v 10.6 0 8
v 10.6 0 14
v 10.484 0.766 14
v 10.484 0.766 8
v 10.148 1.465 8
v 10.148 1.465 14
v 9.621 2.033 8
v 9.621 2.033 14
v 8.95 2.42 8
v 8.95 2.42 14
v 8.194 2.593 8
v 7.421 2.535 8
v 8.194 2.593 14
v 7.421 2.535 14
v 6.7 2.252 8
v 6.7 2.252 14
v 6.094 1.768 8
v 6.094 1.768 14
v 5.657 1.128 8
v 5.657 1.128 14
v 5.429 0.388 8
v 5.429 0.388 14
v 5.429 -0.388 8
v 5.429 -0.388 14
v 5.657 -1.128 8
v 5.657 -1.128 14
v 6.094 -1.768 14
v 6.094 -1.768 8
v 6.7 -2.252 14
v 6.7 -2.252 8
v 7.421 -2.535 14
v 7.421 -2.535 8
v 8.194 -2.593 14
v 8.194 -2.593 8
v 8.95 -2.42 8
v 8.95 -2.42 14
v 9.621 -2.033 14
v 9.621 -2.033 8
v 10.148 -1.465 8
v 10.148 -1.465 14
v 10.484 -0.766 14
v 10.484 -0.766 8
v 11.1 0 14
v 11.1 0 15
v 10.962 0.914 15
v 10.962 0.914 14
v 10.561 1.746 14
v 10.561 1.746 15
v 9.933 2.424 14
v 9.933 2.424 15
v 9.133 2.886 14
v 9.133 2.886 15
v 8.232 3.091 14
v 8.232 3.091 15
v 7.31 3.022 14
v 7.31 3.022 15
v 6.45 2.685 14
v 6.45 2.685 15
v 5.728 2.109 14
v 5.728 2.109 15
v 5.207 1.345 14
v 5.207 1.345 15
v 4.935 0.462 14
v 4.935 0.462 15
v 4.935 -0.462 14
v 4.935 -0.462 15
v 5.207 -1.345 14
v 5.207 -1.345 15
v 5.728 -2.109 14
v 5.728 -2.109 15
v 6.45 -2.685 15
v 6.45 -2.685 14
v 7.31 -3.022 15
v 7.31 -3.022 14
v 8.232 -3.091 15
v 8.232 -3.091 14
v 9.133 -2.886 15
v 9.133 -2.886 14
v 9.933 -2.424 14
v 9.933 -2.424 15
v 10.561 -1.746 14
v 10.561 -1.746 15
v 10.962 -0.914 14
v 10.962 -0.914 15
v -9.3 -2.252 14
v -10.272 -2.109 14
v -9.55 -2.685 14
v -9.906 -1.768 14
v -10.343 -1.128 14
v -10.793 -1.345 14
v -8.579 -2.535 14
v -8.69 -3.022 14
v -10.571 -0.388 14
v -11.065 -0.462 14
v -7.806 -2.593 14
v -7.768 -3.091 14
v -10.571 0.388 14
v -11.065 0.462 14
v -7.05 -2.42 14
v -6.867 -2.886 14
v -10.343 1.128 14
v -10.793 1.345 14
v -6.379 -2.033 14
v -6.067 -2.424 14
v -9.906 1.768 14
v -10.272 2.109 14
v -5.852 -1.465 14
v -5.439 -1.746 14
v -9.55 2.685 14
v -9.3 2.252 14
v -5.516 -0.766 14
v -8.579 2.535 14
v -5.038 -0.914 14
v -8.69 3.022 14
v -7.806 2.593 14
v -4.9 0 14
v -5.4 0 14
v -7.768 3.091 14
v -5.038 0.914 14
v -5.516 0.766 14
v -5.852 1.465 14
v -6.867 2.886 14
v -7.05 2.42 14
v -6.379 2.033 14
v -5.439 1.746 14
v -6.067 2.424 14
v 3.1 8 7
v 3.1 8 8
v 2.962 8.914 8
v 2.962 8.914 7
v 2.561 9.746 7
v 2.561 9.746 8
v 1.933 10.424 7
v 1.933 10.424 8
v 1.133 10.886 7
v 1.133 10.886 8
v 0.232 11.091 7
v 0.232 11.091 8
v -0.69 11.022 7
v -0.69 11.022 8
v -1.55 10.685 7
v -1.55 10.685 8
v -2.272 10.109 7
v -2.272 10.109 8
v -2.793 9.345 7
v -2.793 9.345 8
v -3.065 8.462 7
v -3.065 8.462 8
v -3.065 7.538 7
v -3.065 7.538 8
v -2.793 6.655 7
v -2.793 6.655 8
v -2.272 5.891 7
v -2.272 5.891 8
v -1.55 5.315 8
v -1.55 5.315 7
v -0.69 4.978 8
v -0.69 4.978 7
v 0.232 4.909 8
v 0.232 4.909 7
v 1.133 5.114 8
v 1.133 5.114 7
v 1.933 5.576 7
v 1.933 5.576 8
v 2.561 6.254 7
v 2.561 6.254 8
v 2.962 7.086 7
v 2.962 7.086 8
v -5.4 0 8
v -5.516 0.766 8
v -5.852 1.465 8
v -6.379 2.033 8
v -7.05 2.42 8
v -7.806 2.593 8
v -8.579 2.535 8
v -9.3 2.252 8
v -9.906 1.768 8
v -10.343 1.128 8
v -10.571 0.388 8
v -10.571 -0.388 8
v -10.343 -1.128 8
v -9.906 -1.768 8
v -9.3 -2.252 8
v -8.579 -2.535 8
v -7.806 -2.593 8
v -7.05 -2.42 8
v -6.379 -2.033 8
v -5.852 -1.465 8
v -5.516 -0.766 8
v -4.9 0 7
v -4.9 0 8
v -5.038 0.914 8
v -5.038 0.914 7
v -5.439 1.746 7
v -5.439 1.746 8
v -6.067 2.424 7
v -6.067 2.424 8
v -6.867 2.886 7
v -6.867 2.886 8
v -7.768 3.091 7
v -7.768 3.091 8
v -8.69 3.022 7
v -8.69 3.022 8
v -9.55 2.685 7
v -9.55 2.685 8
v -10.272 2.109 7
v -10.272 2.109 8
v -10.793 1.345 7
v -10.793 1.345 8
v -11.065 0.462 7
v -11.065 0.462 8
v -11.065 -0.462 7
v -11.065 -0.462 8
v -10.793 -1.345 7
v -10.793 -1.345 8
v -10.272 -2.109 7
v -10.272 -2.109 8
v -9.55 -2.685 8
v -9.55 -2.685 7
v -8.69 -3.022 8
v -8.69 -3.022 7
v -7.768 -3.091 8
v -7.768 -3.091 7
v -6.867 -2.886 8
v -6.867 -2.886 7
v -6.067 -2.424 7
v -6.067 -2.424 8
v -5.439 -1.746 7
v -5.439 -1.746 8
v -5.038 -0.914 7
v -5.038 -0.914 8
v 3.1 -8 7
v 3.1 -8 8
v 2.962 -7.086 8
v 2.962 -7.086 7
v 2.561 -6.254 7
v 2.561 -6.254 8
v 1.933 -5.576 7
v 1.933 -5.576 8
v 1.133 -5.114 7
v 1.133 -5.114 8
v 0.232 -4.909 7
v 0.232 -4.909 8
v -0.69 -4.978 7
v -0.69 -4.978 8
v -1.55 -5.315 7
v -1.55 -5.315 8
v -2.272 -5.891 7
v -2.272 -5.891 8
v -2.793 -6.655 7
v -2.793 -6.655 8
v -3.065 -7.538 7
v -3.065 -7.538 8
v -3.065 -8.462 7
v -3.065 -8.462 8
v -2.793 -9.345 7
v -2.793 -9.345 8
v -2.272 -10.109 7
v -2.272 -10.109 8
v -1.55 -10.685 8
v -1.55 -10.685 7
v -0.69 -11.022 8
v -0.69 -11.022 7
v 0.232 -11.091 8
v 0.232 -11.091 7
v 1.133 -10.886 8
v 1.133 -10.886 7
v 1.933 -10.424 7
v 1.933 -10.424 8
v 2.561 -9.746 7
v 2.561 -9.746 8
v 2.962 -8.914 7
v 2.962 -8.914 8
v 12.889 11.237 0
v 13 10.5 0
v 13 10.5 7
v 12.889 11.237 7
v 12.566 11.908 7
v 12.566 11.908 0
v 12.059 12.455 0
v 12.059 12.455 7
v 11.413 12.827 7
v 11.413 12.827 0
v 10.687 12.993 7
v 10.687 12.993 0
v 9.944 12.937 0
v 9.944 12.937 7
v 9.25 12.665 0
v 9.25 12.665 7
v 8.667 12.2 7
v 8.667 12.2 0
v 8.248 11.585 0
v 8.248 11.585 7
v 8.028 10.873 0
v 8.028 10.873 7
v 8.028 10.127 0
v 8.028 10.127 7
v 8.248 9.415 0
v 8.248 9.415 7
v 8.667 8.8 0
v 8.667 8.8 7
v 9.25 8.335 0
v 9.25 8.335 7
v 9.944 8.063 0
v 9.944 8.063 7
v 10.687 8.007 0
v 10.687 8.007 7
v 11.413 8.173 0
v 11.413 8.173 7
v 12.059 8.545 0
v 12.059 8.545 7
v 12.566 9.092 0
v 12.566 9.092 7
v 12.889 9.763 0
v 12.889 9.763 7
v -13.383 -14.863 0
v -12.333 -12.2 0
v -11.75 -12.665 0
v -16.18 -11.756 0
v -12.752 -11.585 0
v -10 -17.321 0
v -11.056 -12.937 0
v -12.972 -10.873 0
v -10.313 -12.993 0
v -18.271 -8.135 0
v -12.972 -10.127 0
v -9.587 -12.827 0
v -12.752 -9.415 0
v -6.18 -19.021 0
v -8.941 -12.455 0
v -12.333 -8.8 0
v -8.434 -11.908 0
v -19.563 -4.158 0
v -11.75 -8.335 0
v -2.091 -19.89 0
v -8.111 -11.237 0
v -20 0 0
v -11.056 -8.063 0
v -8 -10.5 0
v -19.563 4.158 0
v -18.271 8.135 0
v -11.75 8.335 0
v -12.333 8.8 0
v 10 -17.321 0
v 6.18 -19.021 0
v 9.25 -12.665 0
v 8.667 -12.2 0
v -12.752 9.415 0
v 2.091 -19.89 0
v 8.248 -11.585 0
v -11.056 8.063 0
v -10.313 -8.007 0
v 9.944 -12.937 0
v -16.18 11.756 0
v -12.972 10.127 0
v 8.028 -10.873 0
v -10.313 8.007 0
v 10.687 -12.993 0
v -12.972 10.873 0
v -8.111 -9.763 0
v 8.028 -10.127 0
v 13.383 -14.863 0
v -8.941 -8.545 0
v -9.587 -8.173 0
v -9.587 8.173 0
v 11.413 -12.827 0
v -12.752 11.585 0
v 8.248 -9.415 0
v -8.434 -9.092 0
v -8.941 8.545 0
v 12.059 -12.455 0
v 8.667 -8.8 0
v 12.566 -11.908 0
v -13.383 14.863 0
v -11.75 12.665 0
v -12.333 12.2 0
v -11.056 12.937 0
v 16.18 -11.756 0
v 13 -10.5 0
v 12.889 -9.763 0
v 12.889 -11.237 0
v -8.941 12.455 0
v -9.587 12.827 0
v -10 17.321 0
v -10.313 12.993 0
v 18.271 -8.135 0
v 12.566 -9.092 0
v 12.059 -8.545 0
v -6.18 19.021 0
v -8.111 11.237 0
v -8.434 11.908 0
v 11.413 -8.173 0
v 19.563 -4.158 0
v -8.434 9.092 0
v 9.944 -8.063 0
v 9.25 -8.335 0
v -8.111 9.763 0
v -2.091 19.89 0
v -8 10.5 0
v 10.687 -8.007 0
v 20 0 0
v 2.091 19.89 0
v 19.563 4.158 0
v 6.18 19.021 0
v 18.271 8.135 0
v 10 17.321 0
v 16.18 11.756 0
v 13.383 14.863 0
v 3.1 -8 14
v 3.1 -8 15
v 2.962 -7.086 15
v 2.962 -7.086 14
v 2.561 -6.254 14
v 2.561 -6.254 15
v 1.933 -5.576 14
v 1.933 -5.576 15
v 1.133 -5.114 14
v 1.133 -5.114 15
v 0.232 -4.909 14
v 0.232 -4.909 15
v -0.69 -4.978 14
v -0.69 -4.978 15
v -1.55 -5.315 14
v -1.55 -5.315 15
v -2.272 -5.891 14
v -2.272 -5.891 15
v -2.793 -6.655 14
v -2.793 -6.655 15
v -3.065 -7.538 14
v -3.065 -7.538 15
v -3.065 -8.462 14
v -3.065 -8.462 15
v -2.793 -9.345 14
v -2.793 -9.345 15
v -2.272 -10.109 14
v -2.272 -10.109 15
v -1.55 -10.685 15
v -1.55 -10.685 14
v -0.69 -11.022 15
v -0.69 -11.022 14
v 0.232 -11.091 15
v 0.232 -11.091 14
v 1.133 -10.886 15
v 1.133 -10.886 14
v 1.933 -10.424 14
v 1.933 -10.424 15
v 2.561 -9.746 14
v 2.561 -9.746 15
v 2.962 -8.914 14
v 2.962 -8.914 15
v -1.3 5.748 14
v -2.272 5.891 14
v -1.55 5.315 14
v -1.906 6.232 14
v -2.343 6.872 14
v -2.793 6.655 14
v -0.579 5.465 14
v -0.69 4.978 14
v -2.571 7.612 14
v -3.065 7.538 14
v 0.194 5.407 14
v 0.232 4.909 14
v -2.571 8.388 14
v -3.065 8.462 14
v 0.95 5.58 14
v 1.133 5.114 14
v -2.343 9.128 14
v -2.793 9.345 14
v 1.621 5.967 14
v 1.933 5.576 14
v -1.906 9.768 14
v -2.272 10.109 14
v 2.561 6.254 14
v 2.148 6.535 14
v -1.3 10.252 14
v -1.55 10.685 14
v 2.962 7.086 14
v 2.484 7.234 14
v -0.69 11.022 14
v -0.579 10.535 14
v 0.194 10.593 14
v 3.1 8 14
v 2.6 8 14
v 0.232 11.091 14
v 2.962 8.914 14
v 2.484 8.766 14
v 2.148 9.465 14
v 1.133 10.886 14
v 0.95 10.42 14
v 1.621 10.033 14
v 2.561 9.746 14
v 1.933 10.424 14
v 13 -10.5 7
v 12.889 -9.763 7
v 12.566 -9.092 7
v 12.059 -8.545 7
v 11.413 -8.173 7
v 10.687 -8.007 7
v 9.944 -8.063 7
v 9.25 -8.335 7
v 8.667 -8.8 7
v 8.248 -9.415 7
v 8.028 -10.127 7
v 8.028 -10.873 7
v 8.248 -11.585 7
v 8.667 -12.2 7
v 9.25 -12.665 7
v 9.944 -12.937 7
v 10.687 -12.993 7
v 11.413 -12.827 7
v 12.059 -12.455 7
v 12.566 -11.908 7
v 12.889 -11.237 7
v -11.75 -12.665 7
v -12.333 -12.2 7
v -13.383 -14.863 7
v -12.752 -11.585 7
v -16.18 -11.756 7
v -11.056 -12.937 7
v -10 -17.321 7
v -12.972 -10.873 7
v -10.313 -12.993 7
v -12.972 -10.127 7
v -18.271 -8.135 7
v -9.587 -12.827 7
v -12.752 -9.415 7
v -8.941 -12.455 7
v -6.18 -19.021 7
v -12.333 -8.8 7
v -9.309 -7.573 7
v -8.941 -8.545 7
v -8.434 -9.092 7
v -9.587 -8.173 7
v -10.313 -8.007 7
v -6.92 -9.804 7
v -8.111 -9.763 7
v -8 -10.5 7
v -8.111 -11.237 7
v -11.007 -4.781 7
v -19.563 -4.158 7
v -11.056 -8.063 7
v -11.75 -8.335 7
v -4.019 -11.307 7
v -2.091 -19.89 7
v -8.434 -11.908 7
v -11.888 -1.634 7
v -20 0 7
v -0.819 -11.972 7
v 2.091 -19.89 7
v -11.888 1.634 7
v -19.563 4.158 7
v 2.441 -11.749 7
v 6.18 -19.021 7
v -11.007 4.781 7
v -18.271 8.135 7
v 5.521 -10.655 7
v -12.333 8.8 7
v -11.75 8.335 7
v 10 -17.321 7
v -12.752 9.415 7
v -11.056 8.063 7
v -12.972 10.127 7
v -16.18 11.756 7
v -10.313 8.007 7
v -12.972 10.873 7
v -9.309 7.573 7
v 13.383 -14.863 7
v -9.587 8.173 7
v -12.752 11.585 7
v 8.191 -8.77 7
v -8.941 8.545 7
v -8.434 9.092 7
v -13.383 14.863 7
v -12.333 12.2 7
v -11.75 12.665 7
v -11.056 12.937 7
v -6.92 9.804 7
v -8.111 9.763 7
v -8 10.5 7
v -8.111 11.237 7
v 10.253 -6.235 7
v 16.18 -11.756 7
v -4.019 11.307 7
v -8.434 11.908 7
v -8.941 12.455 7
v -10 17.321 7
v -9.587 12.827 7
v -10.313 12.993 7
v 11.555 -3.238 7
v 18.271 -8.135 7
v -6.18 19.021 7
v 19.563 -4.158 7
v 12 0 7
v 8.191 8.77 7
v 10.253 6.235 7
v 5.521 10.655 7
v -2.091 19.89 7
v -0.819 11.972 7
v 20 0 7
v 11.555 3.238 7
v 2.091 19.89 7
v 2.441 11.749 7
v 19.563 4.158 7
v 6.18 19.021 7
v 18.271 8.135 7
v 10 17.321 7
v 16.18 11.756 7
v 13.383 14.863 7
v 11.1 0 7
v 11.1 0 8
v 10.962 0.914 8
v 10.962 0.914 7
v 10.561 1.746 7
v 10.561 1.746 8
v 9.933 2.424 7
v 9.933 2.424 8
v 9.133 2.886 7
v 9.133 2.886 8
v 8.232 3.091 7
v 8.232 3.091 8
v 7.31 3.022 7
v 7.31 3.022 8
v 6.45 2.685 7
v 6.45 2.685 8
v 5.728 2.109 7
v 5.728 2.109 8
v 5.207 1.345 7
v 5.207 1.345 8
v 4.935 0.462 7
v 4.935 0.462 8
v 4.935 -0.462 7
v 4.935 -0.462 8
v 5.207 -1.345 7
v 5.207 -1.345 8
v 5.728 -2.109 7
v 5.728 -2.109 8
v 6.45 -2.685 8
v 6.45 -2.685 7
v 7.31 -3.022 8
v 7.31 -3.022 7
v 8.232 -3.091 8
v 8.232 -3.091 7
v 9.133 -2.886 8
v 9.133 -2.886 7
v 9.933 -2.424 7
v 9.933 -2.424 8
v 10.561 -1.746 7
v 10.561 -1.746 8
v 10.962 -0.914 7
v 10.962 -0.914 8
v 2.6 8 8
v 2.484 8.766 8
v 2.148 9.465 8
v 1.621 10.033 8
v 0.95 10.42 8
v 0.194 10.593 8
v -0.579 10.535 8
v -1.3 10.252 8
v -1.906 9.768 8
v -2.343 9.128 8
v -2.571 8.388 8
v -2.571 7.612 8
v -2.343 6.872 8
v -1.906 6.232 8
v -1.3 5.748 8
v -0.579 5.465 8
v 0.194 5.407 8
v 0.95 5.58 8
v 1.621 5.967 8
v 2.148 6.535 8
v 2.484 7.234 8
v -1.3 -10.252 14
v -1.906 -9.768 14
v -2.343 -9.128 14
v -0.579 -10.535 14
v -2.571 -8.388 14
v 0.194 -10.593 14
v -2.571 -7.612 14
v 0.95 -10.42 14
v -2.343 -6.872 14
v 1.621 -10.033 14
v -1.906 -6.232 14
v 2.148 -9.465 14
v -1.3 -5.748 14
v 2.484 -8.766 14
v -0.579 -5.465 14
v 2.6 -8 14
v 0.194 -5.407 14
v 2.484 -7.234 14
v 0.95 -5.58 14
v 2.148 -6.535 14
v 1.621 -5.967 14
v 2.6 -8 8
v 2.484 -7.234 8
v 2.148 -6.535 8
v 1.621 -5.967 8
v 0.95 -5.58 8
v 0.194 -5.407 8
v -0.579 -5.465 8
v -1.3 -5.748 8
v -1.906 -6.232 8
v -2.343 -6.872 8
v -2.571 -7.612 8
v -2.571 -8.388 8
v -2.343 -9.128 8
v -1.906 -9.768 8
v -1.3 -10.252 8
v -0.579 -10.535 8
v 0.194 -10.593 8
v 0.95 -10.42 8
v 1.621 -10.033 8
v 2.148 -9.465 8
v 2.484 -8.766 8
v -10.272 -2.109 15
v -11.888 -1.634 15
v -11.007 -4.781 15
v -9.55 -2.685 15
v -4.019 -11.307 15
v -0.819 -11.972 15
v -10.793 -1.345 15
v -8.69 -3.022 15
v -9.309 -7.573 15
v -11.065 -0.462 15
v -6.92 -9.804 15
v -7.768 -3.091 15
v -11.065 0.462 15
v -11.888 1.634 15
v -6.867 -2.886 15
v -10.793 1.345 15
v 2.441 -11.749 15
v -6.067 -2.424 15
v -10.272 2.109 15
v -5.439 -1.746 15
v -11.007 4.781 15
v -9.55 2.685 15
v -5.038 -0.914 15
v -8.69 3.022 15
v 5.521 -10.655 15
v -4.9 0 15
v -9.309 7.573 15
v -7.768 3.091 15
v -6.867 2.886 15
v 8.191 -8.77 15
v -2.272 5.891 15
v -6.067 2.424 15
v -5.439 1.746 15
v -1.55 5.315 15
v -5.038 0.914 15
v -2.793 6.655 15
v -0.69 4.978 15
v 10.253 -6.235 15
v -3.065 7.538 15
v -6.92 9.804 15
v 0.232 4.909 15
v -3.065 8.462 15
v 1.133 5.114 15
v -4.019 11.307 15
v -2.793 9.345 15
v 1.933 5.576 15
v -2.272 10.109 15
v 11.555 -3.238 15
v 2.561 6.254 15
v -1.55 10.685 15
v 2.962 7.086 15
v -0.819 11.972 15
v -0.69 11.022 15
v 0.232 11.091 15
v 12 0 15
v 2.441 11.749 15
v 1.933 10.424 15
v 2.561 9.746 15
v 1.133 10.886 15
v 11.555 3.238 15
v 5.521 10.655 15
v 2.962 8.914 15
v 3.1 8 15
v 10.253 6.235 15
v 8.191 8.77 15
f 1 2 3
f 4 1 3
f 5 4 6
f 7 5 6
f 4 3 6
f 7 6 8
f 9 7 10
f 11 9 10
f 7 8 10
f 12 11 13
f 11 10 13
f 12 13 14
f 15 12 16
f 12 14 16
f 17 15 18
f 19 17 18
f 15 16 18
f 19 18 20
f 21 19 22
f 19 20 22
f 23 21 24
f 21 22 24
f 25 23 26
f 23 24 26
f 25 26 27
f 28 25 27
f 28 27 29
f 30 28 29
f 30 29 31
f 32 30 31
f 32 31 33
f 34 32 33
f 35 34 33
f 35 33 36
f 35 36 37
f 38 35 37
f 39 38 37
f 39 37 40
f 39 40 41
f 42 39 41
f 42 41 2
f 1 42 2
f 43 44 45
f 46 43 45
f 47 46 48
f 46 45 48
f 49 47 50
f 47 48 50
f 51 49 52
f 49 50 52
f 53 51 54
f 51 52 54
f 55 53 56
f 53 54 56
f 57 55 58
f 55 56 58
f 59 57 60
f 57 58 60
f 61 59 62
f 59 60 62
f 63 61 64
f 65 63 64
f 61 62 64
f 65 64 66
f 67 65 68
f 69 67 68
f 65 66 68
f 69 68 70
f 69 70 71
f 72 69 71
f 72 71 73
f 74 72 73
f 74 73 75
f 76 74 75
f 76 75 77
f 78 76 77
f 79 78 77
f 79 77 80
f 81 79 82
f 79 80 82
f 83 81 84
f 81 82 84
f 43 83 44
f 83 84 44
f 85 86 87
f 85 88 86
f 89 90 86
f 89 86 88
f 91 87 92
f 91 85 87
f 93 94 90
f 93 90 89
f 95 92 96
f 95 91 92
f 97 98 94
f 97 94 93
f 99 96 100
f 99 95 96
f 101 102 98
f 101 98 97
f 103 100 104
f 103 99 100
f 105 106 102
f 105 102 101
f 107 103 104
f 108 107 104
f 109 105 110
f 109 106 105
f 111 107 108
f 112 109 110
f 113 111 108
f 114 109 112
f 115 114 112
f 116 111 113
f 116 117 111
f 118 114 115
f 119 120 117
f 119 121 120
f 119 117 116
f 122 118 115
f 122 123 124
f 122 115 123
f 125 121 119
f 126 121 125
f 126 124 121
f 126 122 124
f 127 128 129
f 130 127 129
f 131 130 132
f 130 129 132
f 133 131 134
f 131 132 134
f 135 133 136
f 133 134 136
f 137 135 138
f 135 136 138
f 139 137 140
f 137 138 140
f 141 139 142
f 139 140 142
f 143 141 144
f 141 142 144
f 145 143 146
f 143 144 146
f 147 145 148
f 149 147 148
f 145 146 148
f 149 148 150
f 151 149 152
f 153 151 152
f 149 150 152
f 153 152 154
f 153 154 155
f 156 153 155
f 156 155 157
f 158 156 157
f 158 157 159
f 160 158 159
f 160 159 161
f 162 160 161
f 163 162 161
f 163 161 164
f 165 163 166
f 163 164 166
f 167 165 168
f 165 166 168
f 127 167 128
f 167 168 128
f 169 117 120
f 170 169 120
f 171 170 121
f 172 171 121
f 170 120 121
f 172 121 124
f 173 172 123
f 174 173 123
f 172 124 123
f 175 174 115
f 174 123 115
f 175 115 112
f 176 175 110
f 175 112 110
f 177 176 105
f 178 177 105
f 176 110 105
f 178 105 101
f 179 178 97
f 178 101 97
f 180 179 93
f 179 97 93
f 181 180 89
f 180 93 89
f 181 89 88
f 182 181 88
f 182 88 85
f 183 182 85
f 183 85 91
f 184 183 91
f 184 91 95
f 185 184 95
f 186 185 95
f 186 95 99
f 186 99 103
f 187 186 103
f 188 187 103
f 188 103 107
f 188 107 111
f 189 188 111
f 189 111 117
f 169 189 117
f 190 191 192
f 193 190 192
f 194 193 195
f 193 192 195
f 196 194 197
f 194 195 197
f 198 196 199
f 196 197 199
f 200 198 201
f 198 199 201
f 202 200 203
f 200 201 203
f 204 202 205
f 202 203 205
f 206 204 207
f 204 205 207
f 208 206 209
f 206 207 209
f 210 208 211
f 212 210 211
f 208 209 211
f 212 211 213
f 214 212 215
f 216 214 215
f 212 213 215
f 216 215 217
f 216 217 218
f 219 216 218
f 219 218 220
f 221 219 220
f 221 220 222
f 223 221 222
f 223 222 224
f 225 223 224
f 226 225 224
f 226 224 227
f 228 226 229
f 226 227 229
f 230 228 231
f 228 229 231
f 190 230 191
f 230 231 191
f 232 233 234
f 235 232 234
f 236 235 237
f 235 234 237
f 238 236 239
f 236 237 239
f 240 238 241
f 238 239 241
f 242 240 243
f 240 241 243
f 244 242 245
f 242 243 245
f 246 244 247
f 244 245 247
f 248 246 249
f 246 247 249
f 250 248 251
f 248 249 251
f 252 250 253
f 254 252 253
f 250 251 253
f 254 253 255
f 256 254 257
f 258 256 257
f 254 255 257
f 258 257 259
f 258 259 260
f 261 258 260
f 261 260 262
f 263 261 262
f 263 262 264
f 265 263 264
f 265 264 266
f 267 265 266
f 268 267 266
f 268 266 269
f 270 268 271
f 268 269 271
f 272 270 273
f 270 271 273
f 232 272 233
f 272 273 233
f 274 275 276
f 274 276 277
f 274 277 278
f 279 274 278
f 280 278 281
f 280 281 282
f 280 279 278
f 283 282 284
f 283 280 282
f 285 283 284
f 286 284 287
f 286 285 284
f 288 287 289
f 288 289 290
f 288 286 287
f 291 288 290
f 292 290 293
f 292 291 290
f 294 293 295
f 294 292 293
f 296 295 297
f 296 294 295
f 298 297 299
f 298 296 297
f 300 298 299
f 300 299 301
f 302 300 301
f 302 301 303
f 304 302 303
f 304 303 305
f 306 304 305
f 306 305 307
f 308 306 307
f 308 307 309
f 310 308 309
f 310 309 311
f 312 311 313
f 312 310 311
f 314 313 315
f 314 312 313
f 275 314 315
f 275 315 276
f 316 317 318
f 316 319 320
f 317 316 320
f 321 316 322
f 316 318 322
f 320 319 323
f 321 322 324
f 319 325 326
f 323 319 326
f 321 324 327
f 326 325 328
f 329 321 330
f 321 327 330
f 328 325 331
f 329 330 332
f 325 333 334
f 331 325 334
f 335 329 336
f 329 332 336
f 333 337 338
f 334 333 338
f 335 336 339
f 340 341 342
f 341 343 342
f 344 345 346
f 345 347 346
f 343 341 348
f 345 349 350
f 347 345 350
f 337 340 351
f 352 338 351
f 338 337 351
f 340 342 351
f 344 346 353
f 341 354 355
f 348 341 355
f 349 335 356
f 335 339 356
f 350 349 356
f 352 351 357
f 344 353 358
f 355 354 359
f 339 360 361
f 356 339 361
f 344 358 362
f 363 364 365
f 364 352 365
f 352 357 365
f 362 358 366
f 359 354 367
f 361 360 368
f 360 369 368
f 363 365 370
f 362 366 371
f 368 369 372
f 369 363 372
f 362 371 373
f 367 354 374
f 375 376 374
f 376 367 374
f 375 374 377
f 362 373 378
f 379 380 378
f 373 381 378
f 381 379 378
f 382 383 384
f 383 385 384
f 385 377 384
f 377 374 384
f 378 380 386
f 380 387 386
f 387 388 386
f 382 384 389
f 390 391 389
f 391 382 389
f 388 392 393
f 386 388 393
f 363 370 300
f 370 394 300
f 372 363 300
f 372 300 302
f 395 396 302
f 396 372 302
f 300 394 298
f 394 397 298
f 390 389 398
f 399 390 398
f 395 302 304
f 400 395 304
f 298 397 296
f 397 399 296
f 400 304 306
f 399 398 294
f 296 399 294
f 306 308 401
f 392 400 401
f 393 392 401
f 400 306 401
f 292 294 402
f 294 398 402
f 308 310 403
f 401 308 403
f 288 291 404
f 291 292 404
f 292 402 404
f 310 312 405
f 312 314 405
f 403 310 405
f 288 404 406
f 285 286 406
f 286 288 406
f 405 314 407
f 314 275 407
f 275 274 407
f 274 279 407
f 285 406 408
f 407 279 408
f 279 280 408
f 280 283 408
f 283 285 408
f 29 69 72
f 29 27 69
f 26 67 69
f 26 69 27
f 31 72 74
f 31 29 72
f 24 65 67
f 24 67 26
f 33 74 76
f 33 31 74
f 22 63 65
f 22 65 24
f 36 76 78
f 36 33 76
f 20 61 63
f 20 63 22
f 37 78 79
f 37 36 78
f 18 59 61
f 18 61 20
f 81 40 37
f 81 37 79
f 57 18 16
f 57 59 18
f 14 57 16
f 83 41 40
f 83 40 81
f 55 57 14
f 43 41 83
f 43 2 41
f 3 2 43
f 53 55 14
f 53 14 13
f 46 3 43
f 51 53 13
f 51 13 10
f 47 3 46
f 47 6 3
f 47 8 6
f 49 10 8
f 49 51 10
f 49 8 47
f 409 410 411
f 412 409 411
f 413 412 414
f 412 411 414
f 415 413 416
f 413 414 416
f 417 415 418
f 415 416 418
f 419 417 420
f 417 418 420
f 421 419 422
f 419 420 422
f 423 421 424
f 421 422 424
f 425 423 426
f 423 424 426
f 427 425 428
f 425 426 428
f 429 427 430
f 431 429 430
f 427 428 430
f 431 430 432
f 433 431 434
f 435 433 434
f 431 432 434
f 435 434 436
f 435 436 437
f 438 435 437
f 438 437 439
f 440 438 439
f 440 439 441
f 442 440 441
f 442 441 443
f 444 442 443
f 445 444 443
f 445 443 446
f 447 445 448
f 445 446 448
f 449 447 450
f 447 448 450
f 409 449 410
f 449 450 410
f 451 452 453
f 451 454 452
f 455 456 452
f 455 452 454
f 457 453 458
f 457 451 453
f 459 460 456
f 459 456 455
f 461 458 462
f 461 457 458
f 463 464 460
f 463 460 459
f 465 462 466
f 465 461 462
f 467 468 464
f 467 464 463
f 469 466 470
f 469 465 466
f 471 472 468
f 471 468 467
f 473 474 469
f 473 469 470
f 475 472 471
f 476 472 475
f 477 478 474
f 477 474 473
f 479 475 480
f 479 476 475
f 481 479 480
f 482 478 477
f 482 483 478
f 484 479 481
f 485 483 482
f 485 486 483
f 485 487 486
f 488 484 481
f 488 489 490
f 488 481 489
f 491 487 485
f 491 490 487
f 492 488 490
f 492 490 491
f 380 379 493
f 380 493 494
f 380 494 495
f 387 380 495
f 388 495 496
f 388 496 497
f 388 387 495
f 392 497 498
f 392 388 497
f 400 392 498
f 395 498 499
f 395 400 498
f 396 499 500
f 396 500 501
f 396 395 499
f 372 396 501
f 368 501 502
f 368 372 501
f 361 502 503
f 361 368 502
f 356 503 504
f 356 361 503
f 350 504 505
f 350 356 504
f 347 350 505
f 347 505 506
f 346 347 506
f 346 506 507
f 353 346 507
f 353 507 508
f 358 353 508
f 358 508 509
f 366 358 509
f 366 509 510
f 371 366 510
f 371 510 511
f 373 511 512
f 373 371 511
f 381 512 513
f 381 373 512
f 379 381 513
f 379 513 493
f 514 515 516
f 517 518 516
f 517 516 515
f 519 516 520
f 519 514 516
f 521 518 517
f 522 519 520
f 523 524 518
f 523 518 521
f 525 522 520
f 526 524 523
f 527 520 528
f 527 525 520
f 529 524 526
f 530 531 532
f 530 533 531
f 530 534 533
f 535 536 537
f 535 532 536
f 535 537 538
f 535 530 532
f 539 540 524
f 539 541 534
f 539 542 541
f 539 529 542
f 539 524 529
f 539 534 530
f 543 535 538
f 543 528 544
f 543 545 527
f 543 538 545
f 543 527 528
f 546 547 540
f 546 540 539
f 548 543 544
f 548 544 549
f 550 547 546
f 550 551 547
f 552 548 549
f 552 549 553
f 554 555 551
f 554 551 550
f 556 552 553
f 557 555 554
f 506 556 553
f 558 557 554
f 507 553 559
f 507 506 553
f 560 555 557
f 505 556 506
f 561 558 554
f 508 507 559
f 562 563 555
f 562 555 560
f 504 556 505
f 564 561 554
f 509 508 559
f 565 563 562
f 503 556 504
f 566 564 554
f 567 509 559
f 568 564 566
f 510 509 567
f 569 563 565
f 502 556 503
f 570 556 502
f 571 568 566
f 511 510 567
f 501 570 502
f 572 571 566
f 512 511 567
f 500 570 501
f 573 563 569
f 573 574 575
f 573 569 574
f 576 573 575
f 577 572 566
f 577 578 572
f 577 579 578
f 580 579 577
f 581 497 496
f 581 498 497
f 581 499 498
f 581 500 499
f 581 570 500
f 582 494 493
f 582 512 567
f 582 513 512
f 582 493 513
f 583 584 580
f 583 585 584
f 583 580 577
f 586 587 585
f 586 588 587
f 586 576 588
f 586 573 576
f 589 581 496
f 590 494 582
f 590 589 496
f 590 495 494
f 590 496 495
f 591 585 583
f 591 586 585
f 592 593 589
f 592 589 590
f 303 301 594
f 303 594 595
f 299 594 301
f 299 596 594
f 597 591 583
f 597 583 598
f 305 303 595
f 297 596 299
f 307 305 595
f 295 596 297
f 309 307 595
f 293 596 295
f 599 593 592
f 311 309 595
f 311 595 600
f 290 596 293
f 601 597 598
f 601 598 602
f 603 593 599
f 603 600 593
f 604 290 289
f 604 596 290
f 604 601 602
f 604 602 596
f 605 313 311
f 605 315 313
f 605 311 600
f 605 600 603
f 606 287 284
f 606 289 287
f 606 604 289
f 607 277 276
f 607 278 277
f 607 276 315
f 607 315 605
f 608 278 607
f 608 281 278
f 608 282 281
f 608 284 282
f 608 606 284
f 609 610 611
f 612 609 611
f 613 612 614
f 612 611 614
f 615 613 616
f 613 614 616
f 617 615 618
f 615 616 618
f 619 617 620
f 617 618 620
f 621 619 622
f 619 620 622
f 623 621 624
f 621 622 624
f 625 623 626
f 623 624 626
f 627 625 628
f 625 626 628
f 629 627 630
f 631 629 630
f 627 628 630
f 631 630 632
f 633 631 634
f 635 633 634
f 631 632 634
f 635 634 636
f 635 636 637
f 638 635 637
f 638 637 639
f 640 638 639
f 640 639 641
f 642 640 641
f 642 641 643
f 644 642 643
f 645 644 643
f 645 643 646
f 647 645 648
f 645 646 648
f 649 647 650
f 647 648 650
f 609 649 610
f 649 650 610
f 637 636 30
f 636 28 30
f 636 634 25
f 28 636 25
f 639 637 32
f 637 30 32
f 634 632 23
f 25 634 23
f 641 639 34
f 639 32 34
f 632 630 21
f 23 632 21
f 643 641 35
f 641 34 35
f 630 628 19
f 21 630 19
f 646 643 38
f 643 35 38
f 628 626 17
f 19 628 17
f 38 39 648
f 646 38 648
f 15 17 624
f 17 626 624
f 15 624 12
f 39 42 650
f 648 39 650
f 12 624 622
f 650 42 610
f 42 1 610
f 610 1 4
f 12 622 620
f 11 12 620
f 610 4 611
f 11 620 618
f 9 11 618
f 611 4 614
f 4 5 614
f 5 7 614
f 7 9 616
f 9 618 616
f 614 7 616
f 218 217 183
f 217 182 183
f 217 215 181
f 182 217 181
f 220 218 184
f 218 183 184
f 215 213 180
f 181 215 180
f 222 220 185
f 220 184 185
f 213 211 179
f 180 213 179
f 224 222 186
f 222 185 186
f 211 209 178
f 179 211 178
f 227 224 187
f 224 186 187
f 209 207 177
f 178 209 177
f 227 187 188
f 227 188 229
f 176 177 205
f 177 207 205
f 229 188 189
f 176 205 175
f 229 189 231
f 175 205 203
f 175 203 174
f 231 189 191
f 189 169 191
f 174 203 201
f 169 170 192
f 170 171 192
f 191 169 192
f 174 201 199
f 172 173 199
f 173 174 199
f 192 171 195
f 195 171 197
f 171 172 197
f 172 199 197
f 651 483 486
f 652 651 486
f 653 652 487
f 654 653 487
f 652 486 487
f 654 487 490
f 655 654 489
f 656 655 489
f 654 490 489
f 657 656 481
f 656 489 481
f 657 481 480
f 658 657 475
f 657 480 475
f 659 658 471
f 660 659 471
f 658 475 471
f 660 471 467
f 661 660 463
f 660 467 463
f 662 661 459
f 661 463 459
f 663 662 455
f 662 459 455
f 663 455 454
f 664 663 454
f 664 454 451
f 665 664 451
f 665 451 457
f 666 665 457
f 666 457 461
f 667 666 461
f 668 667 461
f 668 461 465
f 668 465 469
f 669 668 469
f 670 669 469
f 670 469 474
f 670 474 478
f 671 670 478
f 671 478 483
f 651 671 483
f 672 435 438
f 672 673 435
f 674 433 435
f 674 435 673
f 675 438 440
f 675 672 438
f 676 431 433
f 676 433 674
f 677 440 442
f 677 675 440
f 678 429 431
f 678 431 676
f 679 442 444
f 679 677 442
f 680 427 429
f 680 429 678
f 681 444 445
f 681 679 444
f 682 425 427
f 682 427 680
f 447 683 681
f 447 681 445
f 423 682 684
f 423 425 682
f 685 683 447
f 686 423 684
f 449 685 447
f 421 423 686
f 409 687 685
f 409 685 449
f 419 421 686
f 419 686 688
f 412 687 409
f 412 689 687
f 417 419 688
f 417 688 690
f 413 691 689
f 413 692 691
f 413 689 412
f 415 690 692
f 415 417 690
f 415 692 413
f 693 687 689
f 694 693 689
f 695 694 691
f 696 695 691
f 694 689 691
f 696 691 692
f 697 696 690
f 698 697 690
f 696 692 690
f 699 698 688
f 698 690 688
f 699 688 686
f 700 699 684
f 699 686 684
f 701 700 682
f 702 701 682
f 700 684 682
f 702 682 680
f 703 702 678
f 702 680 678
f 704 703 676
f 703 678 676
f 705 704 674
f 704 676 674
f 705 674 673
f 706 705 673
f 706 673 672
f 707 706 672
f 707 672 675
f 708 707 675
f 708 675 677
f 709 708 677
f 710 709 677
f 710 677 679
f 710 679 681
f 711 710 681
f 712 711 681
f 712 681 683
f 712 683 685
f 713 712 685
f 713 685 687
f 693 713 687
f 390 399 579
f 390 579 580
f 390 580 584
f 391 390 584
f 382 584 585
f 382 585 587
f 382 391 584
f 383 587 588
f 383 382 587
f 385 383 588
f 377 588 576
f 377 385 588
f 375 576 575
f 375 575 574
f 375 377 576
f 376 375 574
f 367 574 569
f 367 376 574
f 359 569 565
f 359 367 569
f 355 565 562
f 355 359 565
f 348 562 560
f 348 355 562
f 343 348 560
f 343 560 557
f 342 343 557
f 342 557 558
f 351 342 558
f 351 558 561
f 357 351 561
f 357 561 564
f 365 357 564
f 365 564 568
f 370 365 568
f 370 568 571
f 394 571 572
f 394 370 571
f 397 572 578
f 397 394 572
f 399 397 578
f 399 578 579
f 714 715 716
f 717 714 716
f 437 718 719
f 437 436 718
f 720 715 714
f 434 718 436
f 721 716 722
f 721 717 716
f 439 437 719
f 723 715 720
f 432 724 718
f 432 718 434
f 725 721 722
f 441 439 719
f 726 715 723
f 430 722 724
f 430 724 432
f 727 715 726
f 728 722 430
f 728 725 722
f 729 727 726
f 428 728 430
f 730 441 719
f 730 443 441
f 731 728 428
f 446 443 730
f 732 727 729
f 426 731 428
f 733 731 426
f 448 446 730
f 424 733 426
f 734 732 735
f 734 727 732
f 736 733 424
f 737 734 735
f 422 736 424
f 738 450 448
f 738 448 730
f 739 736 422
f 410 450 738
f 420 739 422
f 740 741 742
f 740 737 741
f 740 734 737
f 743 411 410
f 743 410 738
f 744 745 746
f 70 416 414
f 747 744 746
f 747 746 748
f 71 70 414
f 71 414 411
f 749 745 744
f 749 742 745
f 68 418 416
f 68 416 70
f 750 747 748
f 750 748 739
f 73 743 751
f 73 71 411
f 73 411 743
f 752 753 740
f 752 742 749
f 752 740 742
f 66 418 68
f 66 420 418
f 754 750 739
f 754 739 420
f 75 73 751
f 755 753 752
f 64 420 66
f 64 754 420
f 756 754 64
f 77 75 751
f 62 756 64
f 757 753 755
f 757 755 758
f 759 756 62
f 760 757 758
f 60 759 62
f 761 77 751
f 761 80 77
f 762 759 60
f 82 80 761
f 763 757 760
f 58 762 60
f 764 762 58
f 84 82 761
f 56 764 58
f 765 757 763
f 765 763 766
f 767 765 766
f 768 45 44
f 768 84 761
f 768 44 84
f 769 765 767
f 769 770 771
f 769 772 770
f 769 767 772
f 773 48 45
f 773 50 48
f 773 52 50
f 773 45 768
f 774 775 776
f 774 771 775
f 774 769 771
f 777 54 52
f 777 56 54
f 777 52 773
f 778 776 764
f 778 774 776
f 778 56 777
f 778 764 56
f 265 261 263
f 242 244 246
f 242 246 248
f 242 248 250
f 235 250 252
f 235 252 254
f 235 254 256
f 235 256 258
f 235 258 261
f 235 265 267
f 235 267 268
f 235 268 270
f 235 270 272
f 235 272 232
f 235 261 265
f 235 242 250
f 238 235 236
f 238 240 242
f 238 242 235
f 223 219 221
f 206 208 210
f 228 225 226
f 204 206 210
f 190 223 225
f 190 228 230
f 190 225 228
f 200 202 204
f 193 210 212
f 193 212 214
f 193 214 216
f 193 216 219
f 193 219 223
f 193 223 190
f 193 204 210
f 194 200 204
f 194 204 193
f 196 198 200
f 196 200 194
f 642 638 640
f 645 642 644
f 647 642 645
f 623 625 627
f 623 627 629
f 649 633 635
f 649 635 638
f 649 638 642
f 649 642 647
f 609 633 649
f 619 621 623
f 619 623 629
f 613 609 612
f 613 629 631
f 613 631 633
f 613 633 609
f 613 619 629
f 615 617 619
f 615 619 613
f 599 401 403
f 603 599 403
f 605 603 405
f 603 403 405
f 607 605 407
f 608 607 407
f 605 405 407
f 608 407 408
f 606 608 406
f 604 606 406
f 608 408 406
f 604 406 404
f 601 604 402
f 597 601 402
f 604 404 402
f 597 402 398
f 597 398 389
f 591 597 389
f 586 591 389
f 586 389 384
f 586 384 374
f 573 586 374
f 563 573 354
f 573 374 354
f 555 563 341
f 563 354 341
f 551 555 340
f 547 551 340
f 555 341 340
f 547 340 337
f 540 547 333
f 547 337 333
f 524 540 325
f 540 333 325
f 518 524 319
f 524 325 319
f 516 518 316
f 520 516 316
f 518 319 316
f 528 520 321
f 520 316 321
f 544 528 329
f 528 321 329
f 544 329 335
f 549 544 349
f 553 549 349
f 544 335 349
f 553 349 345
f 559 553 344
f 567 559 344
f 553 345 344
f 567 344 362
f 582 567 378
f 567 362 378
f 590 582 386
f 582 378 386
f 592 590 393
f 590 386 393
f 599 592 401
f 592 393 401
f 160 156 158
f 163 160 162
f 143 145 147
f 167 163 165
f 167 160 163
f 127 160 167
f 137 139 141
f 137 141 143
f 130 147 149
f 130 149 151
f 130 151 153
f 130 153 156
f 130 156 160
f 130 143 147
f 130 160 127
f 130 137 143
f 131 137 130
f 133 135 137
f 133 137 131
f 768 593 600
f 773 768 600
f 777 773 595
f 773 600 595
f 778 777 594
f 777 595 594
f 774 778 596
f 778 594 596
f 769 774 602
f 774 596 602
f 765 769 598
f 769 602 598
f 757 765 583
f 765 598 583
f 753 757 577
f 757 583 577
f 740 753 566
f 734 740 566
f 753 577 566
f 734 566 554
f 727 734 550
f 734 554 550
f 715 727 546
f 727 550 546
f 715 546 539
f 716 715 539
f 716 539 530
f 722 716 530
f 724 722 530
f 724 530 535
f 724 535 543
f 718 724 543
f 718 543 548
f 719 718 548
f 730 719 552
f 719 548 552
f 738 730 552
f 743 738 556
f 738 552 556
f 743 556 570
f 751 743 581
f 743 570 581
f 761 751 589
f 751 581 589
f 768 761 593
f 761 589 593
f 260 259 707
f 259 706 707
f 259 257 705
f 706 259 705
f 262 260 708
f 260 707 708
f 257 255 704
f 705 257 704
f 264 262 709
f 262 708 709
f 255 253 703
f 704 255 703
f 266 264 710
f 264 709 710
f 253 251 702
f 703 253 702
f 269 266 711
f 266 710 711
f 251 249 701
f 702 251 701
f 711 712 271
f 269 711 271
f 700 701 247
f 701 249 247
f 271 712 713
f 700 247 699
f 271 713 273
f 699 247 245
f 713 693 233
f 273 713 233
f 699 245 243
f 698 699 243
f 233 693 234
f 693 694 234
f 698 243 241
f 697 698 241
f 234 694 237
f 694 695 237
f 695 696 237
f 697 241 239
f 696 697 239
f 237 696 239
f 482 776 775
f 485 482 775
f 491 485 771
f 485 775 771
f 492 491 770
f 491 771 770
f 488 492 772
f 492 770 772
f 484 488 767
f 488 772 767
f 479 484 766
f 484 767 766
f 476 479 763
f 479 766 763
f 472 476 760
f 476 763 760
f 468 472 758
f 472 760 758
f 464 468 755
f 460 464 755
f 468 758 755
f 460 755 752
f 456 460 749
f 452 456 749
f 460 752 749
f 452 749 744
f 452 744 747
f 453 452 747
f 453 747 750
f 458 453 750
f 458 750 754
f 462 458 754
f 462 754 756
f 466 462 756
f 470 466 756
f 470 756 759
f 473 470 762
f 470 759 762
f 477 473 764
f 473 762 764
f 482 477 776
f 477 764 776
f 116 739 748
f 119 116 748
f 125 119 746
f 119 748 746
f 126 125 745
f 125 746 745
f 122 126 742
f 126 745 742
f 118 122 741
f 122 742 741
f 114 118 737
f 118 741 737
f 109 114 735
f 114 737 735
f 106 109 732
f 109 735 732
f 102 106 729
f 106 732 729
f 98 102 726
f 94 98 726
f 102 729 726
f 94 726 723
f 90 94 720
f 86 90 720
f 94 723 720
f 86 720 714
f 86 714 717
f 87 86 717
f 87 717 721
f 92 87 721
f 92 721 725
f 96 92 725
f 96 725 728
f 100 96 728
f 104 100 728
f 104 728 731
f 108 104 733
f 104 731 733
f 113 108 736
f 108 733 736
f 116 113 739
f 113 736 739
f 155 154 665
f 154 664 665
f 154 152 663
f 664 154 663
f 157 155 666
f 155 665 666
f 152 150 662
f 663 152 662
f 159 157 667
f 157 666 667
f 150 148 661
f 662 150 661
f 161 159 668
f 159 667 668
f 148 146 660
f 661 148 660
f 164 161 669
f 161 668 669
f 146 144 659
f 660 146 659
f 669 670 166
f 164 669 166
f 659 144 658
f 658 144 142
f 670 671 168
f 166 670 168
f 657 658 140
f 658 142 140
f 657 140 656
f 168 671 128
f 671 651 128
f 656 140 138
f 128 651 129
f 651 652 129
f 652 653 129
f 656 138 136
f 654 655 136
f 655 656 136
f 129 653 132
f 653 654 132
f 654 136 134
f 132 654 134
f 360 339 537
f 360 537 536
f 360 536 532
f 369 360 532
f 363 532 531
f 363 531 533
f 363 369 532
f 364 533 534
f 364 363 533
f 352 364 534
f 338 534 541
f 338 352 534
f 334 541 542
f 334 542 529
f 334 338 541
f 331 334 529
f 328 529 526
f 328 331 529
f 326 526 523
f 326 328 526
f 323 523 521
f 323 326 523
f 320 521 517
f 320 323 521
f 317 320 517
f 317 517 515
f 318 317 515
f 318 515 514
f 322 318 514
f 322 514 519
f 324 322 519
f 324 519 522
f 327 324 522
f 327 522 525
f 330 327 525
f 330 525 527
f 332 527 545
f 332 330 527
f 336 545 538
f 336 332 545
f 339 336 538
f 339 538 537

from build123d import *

# Parameters (mm, degrees)
SKETCH_1_R          = 20
SKETCH_1_R_2        = 2.5
EXTRUDE_1_DEPTH     = 7
SKETCH_2_R          = 12
EXTRUDE_2_DEPTH     = 8
SKETCH_3_R          = 2.6
CUT_EXTRUDE_1_DEPTH = 7
SKETCH_4_R          = 3.1
CUT_EXTRUDE_2_DEPTH = 1
SKETCH_6_R          = 3.1
CUT_EXTRUDE_3_DEPTH = 1


with BuildPart() as part:
    # Эскиз1 → Бобышка-Вытянуть1 (new body)
    with BuildSketch(Plane.XY):
        Circle(SKETCH_1_R)
        with Locations((-10.5, 10.5)):
            Circle(SKETCH_1_R_2, mode=Mode.SUBTRACT)
        with Locations((10.5, 10.5)):
            Circle(SKETCH_1_R_2, mode=Mode.SUBTRACT)
        with Locations((10.5, -10.5)):
            Circle(SKETCH_1_R_2, mode=Mode.SUBTRACT)
        with Locations((-10.5, -10.5)):
            Circle(SKETCH_1_R_2, mode=Mode.SUBTRACT)
    extrude(amount=EXTRUDE_1_DEPTH)

    # Эскиз2 → Бобышка-Вытянуть2 (add)
    with BuildSketch(Plane.XY.offset(7)):
        Circle(SKETCH_2_R)
    extrude(amount=EXTRUDE_2_DEPTH)

    # Эскиз3 → Вырез-Вытянуть1 (cut)
    with BuildSketch(Plane.XY.offset(15)):
        with Locations((-8, 0)):
            Circle(SKETCH_3_R)
        with Locations((0, 8)):
            Circle(SKETCH_3_R)
        with Locations((8, 0)):
            Circle(SKETCH_3_R)
        with Locations((0, -8)):
            Circle(SKETCH_3_R)
    extrude(amount=-CUT_EXTRUDE_1_DEPTH, mode=Mode.SUBTRACT)

    # Эскиз4 → Вырез-Вытянуть2 (cut)
    with BuildSketch(Plane.XY.offset(15)):
        with Locations((-8, 0)):
            Circle(SKETCH_4_R)
        with Locations((0, 8)):
            Circle(SKETCH_4_R)
        with Locations((8, 0)):
            Circle(SKETCH_4_R)
        with Locations((0, -8)):
            Circle(SKETCH_4_R)
    extrude(amount=-CUT_EXTRUDE_2_DEPTH, mode=Mode.SUBTRACT)

    # Эскиз6 → Вырез-Вытянуть3 (cut)
    with BuildSketch(Plane.XY.offset(8)):
        with Locations((8, 0)):
            Circle(SKETCH_6_R)
        with Locations((0, 8)):
            Circle(SKETCH_6_R)
        with Locations((-8, 0)):
            Circle(SKETCH_6_R)
        with Locations((0, -8)):
            Circle(SKETCH_6_R)
    extrude(amount=-CUT_EXTRUDE_3_DEPTH, mode=Mode.SUBTRACT)


solid = part.part
